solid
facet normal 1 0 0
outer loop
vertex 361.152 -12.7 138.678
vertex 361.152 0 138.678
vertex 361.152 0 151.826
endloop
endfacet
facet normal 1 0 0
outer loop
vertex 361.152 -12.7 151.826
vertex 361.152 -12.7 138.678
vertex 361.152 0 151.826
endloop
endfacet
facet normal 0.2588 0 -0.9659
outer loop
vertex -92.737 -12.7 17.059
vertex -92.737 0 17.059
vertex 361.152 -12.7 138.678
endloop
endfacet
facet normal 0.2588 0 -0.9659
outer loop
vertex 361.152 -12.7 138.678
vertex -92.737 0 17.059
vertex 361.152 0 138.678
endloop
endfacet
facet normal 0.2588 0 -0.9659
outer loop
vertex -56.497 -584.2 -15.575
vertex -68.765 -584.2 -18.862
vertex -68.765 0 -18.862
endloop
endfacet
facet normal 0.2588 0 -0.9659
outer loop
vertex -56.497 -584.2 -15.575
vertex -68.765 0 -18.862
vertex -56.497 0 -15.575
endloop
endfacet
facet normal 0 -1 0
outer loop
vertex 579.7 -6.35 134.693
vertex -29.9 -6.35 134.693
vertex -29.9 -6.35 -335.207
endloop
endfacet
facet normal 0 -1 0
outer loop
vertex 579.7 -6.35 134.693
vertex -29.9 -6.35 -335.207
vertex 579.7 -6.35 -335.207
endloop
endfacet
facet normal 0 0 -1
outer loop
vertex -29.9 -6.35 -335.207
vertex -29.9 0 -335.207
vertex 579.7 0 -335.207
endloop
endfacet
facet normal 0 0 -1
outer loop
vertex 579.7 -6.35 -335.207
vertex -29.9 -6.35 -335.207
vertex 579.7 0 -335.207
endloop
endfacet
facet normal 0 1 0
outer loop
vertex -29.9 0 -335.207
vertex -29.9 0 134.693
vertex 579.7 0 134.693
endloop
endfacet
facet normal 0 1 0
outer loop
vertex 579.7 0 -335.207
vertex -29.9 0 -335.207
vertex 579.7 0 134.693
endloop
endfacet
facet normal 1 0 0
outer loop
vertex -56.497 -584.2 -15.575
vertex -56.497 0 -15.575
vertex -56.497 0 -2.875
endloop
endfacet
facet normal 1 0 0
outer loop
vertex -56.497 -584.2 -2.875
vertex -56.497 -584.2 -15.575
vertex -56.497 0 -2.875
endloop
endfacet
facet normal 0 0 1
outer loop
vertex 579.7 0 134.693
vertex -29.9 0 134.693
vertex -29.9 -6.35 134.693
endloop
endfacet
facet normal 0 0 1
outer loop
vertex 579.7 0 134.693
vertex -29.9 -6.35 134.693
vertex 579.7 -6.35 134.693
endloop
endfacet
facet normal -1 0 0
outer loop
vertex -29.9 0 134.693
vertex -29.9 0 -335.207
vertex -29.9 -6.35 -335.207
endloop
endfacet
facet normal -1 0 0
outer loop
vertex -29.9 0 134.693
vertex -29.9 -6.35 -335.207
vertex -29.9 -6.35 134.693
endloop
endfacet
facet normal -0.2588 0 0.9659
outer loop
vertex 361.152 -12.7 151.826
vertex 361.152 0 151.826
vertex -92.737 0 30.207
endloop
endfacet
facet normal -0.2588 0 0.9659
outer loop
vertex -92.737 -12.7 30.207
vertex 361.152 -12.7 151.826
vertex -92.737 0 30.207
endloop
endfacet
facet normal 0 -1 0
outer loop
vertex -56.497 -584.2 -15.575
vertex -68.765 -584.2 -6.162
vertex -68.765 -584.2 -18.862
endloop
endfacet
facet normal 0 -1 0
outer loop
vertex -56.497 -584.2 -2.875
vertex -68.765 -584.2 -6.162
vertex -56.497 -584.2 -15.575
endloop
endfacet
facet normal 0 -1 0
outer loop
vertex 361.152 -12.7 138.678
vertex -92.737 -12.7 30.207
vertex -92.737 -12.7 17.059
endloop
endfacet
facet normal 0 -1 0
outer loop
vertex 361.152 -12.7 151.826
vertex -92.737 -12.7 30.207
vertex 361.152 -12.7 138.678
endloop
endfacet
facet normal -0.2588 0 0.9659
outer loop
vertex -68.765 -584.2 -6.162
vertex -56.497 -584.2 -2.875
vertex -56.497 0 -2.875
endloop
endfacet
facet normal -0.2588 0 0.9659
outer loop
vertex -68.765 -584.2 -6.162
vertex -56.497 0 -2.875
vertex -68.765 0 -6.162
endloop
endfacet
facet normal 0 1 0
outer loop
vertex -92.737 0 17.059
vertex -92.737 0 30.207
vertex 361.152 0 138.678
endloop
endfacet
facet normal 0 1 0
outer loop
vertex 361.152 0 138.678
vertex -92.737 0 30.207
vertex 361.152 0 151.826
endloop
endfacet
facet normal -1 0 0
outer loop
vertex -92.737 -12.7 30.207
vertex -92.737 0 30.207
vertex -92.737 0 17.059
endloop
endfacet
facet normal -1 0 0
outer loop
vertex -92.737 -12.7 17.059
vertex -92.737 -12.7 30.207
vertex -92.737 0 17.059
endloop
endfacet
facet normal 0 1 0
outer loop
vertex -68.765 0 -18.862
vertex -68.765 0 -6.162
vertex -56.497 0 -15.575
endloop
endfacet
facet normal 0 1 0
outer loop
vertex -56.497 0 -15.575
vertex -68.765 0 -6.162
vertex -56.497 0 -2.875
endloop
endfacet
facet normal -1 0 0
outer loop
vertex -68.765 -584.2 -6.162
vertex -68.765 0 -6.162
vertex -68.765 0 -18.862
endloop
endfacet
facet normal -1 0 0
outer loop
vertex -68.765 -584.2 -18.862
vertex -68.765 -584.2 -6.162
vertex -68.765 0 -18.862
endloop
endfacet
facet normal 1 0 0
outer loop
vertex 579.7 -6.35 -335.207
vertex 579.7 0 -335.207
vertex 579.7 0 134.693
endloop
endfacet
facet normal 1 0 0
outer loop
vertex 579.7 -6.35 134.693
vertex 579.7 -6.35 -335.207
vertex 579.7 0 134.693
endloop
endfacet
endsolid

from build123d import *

# Parameters (mm, degrees)
F1_DEPTH = 12.7
F3_DEPTH = 584.2
F4_W     = 609.6
F4_H     = 469.9
F5_DEPTH = 6.35


with BuildPart() as f1:
    # F0 (on Front) → F1 (new body)
    with BuildSketch(Plane.XZ):
        Polygon((361.151774, 151.826409), (-92.736772, 30.20734), (-92.736772, 17.059332), (361.151774, 138.678402), align=None)
    extrude(amount=F1_DEPTH)


with BuildPart() as f3:
    # F2 (on Front) → F3 (new body)
    with BuildSketch(Plane.XZ):
        Polygon((-56.497282, -2.874773), (-68.76454, -6.161775), (-68.76454, -18.861775), (-56.497282, -15.574773), align=None)
    extrude(amount=F3_DEPTH)


with BuildPart() as f5:
    # F4 (on Front) → F5 (new body)
    with BuildSketch(Plane.XZ):
        with Locations((274.899643, -100.257091)):
            Rectangle(F4_W, F4_H)
    extrude(amount=F5_DEPTH)


solid = Compound([f1.part, f3.part, f5.part])
